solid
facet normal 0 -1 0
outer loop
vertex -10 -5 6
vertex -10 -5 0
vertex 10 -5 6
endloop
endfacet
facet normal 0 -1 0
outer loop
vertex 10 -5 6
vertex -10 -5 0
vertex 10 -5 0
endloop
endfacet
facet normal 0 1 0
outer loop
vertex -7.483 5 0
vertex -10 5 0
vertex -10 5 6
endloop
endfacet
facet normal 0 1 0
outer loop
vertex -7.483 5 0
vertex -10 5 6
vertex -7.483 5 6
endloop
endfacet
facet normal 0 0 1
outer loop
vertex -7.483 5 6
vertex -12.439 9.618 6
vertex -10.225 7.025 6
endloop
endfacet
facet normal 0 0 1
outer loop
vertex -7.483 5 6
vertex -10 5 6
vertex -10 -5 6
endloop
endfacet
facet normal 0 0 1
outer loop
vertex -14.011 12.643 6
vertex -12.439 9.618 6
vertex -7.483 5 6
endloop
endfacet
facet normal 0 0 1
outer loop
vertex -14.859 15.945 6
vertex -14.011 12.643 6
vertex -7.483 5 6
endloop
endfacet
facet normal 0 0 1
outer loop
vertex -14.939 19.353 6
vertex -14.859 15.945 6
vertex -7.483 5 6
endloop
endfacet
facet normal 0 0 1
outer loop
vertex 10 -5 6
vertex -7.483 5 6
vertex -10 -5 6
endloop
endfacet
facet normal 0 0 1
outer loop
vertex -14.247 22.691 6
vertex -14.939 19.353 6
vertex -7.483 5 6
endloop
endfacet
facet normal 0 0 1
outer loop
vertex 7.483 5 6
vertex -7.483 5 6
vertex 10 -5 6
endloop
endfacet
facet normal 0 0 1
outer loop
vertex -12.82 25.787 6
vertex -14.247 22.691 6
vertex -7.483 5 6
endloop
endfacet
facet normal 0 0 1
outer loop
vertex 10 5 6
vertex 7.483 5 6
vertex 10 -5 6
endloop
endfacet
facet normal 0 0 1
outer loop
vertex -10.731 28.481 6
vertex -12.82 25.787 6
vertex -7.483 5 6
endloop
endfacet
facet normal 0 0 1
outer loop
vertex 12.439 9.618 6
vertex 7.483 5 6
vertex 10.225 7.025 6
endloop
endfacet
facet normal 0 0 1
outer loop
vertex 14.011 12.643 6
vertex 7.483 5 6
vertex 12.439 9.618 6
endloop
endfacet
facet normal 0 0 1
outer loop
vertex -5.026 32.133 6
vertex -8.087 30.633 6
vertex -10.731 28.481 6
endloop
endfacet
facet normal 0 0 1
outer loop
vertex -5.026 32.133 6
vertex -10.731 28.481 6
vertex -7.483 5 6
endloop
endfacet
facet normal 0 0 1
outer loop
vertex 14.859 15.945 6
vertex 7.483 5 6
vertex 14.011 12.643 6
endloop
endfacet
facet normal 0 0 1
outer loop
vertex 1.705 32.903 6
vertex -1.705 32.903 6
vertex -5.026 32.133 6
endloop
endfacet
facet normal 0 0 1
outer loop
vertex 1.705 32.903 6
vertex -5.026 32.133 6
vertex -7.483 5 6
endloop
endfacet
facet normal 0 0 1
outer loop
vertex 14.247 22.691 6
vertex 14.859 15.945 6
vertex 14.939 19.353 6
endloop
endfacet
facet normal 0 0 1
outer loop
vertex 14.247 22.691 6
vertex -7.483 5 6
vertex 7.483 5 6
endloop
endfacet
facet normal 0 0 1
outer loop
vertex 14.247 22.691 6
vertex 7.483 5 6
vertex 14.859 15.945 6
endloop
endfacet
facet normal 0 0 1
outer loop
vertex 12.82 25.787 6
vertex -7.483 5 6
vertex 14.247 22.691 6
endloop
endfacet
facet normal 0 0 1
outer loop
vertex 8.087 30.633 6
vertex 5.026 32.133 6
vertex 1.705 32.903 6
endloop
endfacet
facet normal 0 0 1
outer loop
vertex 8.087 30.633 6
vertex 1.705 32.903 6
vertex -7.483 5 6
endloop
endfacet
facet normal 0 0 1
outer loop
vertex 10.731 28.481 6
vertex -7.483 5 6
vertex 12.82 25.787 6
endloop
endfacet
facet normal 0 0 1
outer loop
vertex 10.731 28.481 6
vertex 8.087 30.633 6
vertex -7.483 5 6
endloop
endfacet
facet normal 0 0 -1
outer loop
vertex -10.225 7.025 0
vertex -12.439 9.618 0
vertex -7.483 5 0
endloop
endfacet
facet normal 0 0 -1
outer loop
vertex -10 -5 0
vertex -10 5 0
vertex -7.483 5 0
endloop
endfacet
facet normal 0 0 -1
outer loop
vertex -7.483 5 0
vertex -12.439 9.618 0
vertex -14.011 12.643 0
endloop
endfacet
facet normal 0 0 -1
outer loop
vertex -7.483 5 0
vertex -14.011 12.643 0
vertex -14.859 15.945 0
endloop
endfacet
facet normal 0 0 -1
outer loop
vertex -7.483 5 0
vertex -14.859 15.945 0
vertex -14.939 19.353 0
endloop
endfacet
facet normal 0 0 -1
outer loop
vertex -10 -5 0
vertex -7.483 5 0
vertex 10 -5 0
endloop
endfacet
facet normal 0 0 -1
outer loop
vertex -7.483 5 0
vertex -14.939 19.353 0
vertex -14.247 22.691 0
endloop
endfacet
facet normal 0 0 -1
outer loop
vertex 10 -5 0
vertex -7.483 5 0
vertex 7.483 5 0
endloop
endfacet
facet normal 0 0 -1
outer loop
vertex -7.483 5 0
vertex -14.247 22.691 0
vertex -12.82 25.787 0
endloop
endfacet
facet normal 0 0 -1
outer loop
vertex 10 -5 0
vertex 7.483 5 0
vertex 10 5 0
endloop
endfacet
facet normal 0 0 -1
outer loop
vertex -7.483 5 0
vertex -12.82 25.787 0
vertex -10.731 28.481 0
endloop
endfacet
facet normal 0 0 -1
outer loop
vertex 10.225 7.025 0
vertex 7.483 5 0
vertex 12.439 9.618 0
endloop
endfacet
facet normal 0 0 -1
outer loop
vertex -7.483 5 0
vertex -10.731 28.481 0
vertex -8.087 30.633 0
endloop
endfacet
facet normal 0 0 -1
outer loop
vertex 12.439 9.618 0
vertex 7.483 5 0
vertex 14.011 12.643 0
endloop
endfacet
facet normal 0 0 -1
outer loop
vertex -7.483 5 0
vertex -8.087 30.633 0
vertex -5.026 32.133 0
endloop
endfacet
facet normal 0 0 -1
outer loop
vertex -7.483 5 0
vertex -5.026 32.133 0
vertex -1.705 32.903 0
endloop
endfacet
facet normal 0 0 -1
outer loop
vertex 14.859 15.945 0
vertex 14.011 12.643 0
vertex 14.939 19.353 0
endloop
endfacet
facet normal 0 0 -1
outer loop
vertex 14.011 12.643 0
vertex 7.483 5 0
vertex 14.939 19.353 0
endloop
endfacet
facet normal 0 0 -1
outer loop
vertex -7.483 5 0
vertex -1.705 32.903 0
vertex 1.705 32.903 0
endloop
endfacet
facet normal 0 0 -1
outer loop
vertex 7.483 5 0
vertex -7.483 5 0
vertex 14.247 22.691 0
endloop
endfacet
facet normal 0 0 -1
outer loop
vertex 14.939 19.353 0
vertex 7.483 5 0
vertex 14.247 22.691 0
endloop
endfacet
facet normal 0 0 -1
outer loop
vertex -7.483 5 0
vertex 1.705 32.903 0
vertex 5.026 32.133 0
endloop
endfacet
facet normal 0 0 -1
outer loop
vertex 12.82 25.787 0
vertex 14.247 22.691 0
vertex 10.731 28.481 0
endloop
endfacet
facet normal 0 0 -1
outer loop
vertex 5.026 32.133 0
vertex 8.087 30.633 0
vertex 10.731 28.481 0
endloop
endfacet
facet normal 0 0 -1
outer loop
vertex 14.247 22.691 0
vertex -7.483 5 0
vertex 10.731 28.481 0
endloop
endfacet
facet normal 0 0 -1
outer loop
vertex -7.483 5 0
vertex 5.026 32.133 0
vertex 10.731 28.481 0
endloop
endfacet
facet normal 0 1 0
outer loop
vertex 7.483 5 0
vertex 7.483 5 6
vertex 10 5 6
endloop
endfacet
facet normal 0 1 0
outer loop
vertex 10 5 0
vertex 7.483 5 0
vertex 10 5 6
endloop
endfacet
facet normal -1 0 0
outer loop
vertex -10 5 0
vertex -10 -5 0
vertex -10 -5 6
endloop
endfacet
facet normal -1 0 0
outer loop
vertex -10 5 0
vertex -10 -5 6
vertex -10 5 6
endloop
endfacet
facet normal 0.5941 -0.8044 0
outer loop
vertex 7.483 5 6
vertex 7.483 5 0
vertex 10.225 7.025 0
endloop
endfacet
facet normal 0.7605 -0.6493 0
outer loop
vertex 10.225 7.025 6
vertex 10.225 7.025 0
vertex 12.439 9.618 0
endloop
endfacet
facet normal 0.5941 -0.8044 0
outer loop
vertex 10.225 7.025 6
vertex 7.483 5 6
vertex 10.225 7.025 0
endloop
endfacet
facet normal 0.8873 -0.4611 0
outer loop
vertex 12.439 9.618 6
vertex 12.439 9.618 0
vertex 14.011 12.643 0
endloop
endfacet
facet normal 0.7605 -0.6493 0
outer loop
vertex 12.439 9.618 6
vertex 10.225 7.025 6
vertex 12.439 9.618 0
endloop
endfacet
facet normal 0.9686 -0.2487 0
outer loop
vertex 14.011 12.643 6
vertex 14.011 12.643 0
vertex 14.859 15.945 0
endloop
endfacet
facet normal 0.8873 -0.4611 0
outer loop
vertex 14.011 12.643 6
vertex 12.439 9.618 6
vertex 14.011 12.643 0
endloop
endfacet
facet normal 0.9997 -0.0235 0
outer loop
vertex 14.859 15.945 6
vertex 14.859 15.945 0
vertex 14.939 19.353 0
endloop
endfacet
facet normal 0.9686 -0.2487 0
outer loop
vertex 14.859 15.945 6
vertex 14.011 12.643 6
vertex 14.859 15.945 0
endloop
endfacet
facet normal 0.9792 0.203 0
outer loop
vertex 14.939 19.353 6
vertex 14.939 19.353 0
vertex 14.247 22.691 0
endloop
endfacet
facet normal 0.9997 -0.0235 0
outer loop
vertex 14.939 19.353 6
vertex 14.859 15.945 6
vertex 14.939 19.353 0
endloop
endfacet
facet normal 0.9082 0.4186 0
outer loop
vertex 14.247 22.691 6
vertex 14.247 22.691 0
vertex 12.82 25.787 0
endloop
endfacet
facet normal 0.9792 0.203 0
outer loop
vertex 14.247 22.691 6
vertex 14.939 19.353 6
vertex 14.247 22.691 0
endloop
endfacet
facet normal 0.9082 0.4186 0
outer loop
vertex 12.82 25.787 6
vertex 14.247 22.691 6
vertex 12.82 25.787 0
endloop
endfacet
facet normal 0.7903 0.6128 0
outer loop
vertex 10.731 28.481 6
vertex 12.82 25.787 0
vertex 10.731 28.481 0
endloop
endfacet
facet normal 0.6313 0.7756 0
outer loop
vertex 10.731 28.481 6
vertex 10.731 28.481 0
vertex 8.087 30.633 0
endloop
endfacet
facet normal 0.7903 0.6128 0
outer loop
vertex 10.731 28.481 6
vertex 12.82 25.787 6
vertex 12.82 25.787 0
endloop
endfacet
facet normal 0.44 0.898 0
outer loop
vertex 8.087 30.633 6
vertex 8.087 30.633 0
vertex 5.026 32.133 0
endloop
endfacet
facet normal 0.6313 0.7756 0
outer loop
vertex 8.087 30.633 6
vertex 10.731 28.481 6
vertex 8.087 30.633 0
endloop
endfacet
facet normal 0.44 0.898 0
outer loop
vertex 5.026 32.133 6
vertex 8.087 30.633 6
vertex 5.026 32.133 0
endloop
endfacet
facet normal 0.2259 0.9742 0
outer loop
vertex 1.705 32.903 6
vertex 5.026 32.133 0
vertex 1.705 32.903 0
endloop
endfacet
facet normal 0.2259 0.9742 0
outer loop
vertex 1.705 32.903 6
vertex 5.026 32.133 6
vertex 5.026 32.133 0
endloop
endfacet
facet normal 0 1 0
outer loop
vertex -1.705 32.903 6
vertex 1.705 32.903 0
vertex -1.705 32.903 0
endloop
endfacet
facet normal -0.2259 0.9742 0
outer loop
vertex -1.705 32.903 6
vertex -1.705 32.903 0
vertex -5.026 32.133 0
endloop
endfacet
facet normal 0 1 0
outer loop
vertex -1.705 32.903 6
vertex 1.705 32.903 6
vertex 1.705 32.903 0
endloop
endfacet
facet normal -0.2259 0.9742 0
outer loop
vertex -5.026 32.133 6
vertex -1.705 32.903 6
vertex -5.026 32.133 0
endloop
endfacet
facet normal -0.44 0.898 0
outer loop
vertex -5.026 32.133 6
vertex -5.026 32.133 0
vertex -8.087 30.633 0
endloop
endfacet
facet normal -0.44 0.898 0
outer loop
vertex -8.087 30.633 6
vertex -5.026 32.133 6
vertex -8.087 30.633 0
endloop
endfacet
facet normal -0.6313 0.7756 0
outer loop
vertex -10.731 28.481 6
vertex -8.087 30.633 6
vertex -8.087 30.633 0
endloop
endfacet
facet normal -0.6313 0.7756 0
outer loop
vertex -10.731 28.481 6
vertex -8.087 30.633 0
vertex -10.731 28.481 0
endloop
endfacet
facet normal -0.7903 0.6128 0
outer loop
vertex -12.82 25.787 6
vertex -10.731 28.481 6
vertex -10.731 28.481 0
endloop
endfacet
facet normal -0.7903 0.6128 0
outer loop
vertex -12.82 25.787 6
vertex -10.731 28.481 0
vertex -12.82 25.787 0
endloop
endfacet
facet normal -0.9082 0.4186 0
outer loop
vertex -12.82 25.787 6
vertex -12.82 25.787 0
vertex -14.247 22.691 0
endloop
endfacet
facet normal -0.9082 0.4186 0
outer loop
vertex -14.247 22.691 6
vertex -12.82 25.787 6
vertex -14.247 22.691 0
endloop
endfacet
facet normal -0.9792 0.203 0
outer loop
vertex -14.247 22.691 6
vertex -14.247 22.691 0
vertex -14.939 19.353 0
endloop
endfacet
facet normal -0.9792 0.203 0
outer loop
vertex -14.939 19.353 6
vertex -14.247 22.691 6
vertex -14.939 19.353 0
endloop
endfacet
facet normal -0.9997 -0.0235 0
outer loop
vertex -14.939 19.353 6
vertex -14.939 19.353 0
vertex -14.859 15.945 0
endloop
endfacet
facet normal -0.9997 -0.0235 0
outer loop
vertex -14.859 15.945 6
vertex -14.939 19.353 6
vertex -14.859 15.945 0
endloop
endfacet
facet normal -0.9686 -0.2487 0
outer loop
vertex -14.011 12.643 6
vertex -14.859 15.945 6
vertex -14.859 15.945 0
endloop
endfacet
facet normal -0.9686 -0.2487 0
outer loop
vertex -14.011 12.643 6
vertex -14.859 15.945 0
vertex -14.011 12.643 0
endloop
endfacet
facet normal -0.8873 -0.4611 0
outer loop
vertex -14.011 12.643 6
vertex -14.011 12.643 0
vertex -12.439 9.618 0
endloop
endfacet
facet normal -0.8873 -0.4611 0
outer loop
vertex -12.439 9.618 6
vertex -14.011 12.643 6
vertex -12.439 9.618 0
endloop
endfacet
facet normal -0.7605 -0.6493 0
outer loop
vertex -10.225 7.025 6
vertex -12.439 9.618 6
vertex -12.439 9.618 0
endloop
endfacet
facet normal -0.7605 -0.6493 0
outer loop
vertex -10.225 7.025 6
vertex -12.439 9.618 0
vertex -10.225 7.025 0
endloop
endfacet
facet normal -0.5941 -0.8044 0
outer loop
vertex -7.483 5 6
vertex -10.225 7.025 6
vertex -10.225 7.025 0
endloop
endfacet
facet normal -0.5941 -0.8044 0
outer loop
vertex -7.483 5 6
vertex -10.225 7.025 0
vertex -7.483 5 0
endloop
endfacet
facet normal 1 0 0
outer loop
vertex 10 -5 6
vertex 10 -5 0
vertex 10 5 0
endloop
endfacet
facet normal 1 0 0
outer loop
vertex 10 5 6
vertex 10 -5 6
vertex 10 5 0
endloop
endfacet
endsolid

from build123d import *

# Parameters (mm, degrees)
ESQUISSE1_W        = 20
ESQUISSE1_H        = 10
BOSS_EXTRU_1_DEPTH = 6
ESQUISSE2_R        = 15
BOSS_EXTRU_2_DEPTH = 6


with BuildPart() as part:
    # Esquisse1 → Boss.-Extru.1 (new body)
    with BuildSketch(Plane.XY):
        Rectangle(ESQUISSE1_W, ESQUISSE1_H)
    extrude(amount=BOSS_EXTRU_1_DEPTH)

    # Esquisse2 → Boss.-Extru.2 (add)
    with BuildSketch(Plane.XY.offset(6)):
        with Locations((0, 18)):
            Circle(ESQUISSE2_R)
    extrude(amount=-BOSS_EXTRU_2_DEPTH)


solid = part.part
